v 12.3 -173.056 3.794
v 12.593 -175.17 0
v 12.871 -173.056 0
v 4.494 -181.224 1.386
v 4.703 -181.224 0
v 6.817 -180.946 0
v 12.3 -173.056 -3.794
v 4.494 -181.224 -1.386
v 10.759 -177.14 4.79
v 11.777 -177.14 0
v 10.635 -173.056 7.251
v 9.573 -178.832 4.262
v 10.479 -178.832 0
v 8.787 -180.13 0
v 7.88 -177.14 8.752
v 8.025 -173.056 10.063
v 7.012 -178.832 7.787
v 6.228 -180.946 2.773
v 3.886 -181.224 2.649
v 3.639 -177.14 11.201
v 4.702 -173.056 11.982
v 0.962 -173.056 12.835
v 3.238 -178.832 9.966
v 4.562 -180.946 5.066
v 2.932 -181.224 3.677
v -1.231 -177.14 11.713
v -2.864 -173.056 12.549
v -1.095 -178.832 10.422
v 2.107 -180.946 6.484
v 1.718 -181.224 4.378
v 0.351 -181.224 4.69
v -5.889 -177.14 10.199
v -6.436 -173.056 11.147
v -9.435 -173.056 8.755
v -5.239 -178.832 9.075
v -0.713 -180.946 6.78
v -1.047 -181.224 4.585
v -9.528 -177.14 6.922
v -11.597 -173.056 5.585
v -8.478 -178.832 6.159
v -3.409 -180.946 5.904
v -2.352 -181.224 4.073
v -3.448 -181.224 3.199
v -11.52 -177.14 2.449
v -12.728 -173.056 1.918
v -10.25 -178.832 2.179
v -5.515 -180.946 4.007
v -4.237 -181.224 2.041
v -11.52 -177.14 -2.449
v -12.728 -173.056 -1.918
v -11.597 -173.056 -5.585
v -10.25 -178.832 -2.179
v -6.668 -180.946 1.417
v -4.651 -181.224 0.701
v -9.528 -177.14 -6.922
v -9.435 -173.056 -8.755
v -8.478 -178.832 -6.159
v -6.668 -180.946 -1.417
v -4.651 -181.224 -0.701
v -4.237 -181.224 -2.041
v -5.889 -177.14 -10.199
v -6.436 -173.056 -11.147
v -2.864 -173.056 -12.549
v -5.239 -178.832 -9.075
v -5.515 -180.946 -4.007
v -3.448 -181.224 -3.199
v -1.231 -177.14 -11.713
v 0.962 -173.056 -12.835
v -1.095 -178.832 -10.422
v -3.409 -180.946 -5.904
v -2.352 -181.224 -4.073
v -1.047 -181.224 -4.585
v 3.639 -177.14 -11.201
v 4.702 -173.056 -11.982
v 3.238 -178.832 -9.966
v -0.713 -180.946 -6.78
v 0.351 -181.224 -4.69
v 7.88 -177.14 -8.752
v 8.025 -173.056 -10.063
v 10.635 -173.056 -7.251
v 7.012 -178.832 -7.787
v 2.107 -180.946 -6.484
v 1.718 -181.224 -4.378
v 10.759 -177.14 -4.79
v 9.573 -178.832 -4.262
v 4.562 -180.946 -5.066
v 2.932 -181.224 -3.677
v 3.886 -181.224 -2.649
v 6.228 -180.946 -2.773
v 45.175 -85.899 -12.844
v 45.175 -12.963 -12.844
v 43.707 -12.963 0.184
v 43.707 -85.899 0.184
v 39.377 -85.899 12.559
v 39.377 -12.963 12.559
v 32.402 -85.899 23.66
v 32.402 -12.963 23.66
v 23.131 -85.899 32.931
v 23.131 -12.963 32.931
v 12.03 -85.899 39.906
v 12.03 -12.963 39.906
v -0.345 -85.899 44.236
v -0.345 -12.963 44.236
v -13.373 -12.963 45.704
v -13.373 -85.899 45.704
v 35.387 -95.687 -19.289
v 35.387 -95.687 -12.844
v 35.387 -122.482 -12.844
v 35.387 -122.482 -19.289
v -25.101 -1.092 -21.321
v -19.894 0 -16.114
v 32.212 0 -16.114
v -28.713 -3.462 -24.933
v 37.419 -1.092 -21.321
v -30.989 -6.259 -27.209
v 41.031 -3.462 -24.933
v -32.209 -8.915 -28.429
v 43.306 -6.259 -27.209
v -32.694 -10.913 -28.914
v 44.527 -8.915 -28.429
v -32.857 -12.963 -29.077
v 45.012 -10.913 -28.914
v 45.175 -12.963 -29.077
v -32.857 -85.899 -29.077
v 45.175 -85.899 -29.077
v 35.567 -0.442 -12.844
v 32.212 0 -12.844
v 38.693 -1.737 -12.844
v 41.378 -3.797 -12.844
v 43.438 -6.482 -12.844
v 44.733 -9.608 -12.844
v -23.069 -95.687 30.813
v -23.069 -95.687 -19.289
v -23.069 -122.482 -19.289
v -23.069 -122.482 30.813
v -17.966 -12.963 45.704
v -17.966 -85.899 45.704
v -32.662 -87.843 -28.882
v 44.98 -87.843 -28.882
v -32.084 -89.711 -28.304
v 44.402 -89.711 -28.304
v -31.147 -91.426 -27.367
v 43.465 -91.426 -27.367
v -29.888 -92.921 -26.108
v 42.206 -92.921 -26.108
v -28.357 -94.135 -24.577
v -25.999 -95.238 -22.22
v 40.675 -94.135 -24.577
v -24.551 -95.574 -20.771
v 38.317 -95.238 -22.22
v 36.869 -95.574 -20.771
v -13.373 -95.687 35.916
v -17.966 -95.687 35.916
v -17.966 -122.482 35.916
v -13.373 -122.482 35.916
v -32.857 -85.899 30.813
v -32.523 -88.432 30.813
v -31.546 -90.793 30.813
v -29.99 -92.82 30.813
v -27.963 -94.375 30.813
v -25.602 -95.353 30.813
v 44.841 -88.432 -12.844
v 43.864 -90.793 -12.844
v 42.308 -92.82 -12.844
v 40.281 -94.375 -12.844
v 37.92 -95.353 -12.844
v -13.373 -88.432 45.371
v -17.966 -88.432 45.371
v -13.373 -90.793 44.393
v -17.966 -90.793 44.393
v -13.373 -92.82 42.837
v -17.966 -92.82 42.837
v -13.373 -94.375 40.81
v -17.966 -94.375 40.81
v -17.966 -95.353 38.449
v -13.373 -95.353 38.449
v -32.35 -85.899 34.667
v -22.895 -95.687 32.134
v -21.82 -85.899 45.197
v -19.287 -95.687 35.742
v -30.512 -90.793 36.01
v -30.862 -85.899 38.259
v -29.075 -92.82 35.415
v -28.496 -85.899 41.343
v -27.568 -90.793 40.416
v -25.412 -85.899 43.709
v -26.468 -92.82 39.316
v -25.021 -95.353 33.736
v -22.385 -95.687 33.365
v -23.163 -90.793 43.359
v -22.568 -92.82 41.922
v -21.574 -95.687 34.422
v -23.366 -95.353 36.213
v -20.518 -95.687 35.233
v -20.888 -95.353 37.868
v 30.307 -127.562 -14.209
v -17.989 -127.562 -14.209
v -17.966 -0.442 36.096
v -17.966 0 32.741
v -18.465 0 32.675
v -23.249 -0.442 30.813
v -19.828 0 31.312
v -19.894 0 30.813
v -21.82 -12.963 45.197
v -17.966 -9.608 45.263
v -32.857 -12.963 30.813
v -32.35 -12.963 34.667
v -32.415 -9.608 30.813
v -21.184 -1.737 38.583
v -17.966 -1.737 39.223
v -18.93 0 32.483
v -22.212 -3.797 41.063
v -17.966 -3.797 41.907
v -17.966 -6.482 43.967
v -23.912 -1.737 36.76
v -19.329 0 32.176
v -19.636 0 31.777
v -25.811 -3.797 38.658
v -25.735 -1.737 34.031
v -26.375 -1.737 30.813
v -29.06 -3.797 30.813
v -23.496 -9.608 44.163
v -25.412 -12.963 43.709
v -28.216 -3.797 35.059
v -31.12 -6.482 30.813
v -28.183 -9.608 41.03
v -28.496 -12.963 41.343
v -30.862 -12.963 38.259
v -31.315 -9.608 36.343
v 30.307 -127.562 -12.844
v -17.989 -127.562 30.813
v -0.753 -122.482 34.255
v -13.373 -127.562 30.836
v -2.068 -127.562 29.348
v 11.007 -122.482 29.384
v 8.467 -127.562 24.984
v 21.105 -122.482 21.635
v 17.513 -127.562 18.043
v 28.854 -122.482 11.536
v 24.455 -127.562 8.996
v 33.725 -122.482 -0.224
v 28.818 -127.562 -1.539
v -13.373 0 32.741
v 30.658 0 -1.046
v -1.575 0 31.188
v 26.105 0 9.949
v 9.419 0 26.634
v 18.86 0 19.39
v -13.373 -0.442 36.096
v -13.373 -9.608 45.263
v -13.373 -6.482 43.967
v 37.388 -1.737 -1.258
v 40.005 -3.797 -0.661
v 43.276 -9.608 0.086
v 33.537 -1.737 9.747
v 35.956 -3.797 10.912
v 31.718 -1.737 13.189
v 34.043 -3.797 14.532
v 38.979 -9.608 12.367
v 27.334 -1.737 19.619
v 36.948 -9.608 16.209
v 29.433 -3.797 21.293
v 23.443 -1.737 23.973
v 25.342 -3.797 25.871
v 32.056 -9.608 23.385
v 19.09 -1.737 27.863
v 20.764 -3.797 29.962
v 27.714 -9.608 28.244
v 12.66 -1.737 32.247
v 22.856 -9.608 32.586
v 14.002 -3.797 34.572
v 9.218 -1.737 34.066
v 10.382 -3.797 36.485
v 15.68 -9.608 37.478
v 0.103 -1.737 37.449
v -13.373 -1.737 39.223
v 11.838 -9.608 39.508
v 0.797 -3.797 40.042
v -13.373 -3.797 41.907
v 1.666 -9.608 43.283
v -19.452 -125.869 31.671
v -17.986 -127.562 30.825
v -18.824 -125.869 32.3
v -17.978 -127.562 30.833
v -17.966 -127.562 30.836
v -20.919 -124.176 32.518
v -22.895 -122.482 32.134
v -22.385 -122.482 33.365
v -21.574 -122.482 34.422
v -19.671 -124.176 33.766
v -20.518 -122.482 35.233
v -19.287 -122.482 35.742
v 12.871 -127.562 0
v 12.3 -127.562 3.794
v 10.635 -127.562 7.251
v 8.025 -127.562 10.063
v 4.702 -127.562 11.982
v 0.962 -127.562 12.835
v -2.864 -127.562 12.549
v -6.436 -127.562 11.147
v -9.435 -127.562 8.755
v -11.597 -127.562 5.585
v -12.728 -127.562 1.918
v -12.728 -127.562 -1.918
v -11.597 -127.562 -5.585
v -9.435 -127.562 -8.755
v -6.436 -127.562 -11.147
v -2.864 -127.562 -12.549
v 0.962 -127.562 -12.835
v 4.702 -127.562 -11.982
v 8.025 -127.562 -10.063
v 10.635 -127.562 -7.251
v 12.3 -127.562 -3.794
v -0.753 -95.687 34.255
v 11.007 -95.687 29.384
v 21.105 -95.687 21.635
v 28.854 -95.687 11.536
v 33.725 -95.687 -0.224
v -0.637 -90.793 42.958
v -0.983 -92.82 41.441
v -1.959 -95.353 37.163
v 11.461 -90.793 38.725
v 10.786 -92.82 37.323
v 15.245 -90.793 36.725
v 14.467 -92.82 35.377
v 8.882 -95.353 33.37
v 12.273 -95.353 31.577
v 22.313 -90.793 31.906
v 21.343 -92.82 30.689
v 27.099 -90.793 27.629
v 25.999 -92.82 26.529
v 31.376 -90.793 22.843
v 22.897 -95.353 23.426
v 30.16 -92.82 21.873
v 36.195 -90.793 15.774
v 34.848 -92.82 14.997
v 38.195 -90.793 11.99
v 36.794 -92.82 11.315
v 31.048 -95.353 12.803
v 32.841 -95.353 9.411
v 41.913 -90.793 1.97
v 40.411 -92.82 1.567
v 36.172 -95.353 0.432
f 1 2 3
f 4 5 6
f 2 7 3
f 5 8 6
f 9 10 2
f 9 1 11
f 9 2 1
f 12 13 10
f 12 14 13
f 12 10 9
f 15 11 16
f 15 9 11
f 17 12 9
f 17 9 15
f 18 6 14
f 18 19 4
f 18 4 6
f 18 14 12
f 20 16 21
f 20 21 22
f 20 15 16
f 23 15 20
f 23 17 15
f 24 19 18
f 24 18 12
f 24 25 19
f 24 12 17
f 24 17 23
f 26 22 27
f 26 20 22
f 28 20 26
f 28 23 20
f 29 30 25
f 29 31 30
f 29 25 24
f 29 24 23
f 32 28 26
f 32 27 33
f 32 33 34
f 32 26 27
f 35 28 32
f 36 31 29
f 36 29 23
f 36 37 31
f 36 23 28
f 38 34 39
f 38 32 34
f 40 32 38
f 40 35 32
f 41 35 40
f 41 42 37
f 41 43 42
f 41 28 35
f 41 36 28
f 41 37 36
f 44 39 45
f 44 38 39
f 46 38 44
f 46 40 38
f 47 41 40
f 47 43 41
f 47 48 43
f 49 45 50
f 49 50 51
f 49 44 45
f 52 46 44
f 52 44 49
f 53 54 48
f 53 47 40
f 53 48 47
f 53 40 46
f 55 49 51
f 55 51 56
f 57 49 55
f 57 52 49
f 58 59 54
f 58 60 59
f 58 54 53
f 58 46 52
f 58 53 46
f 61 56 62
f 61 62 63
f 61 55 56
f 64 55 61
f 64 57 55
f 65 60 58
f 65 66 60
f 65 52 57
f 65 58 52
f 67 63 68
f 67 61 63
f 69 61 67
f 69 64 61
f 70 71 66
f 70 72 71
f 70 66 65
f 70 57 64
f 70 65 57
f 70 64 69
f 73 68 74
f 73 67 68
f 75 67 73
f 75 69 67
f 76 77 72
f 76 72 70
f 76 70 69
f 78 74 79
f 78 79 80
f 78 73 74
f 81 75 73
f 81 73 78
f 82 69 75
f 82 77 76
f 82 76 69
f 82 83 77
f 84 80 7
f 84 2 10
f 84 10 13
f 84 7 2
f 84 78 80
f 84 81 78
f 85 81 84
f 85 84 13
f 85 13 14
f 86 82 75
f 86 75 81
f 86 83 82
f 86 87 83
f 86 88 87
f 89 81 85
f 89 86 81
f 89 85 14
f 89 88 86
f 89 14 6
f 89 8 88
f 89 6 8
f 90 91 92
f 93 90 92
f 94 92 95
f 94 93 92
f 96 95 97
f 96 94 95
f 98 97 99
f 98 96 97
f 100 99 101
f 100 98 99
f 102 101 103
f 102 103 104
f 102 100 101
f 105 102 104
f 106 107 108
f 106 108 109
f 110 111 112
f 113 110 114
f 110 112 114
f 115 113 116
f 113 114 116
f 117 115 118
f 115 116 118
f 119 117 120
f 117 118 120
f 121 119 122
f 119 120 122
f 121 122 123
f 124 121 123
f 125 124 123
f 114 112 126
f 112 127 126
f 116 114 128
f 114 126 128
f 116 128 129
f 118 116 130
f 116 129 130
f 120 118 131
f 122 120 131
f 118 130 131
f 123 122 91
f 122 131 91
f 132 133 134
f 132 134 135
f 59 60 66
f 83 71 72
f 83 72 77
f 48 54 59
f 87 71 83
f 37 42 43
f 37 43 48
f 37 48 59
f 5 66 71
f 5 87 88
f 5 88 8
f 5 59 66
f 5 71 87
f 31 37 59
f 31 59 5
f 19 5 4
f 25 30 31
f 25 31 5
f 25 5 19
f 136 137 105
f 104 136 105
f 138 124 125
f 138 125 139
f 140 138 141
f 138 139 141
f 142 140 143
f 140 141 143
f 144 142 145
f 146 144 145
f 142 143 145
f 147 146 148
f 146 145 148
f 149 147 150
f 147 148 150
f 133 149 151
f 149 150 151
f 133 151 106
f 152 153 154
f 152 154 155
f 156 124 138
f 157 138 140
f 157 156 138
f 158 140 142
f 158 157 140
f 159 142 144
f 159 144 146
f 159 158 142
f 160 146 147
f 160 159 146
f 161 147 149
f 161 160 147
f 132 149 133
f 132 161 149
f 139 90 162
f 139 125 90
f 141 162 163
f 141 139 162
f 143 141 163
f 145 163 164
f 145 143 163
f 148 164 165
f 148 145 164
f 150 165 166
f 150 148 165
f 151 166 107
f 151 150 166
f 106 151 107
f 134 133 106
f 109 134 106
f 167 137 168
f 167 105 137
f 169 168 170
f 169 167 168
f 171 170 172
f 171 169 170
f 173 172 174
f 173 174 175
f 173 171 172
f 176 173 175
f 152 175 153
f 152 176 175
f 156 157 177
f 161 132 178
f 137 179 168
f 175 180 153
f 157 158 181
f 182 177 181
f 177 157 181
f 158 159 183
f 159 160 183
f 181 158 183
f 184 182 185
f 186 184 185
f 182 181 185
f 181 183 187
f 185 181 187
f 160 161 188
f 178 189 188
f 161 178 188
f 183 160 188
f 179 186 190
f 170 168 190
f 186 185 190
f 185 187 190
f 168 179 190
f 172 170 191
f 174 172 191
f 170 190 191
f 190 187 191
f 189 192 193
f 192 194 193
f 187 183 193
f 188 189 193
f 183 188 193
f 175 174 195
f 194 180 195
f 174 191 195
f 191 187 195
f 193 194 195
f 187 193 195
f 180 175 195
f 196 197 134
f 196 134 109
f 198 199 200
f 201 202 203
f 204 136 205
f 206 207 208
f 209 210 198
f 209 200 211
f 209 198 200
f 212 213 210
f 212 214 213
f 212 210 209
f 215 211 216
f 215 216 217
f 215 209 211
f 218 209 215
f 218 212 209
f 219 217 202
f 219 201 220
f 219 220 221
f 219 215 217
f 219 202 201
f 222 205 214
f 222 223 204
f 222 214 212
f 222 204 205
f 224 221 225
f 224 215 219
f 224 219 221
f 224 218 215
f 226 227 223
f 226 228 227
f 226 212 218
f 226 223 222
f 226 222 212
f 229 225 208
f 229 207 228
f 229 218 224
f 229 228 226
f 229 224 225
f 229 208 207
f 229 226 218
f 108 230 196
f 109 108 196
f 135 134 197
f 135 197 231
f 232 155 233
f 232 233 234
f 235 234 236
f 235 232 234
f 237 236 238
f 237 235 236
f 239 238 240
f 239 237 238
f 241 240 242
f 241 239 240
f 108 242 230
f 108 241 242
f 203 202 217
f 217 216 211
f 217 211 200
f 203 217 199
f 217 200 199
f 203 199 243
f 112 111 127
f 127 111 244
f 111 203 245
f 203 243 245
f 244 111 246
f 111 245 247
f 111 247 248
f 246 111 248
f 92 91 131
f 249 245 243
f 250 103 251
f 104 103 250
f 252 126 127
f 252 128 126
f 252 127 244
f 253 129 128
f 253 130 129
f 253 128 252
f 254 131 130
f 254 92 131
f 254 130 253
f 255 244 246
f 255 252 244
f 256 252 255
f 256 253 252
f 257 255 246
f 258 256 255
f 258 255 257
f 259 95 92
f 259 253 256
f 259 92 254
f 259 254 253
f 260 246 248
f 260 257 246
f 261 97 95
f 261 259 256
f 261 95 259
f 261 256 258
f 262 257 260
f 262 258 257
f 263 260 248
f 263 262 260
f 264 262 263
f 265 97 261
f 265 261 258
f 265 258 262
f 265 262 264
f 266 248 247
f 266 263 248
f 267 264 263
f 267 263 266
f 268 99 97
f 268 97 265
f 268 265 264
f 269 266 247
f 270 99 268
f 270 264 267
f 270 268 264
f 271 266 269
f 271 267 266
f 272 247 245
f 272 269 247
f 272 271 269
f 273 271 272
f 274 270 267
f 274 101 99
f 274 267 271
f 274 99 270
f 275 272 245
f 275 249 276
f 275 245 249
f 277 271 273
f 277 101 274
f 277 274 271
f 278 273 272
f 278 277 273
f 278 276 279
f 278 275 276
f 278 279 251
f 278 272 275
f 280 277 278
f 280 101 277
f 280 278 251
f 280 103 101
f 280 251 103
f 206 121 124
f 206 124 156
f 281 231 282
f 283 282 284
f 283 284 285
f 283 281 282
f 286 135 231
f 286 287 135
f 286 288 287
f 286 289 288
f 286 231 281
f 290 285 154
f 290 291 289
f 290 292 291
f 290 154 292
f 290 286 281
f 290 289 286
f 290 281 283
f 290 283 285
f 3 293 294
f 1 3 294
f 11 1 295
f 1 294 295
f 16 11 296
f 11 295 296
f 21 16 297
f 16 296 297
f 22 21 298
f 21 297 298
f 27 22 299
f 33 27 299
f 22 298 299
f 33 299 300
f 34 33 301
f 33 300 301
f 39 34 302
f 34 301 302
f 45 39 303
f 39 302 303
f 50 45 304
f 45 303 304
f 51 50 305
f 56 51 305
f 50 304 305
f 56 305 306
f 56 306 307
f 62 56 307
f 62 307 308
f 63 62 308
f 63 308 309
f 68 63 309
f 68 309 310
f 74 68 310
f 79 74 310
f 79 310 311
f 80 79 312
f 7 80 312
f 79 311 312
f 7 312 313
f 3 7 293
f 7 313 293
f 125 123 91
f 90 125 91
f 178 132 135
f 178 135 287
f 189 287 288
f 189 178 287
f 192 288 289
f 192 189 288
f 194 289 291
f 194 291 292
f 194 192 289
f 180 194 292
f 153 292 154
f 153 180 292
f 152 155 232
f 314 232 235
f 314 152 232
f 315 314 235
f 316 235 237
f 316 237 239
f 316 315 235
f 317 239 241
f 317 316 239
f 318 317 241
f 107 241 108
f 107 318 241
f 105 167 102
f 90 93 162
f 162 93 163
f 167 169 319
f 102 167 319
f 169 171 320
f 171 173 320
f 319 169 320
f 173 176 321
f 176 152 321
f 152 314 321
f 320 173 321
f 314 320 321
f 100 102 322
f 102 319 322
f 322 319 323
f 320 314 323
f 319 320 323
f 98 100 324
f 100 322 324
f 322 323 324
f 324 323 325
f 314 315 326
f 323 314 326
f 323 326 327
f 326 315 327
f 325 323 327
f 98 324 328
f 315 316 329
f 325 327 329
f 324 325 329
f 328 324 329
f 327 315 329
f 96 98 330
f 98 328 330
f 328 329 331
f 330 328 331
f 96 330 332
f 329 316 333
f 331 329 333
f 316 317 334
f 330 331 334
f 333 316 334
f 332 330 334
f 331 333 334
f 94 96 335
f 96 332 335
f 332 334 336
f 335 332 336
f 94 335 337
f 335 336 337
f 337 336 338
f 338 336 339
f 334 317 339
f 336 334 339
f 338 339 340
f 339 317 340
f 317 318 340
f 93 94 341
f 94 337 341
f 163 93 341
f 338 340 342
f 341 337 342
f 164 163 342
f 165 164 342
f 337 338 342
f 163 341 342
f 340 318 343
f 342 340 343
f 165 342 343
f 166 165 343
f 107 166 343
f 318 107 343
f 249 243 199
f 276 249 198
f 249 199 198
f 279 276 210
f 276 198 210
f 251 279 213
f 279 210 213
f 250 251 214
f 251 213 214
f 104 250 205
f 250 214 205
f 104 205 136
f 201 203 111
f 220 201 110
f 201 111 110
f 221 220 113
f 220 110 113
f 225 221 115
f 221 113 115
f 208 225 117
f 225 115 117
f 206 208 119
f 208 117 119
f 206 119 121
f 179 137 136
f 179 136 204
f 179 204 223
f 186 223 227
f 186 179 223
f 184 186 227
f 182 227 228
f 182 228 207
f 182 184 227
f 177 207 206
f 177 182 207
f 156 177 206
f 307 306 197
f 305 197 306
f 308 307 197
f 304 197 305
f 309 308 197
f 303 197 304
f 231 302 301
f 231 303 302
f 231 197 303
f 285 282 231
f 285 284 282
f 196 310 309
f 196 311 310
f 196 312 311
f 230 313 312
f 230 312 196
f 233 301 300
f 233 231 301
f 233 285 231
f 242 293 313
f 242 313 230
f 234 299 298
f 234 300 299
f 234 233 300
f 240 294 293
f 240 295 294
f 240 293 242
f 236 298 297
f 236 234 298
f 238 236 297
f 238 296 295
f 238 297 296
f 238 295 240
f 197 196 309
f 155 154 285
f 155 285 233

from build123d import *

# Parameters (mm, degrees)
F0_W     = 78.0319198966
F0_H     = 74.7814178467
F1_DEPTH = 95.6868380308
F2_R     = 58.5481836396
F3_R     = 14.8908027662
F4_R     = 9.7880573939
F5_R     = 12.9631428279
F6_DEPTH = 31.8753421307
F7_SIZE  = 5.08
F8_R     = 12.871399231
F9_DEPTH = 53.6622554064
F10_R    = 8.1683236061


with BuildPart() as f1:
    # F0 (on Front) → F1 (new body)
    with BuildSketch(Plane.XZ):
        with Locations((6.1589442194, 8.3135068417)):
            Rectangle(F0_W, F0_H)
    extrude(amount=F1_DEPTH)

    # F2
    f2_edges = [f1.edges().sort_by_distance(p)[0] for p in [
        (45.174904, -47.843419, 45.704216),
    ]]
    fillet(f2_edges, radius=F2_R)

    # F3
    f3_edges = [f1.edges().sort_by_distance(p)[0] for p in [
        (-32.857016, -47.843419, 45.704216),
    ]]
    fillet(f3_edges, radius=F3_R)

    # F4
    f4_edges = [f1.edges().sort_by_distance(p)[0] for p in [
        (-15.669746, -95.686838, 45.704216),
        (-28.495601, -95.686838, 41.342801),
        (28.026538, -95.686838, 28.55585),
        (-32.857016, -95.686838, 0.868105),
        (45.174904, -95.686838, -20.960585),
        (6.158944, -95.686838, -29.077202),
    ]]
    fillet(f4_edges, radius=F4_R)

    # F5
    f5_edges = [f1.edges().sort_by_distance(p)[0] for p in [
        (28.026538, 0, 28.55585),
        (-15.669746, 0, 45.704216),
        (-28.495601, 0, 41.342801),
        (-32.857016, 0, 0.868105),
        (45.174904, 0, -20.960585),
        (6.158944, 0, -29.077202),
    ]]
    fillet(f5_edges, radius=F5_R)

    # F6 (add): a face of the model
    f6_faces = [f1.faces().sort_by_distance(p)[0] for p in [
        (2.7661274156, -95.6868380308, 5.1141155416),
    ]]
    extrude(f6_faces, amount=F6_DEPTH)

    # F7
    f7_edges = [f1.edges().sort_by_distance(p)[0] for p in [
        (35.386847, -127.56218, -16.066556),
        (6.158944, -127.56218, -19.289145),
        (21.105336, -127.56218, 21.634648),
        (-23.068958, -127.56218, 5.762134),
        (-15.669746, -127.56218, 35.916158),
        (-21.574399, -127.56218, 34.421599),
    ]]
    chamfer(f7_edges, length=F7_SIZE)

    # F8 (on face) → F9 (join)
    with BuildSketch(Plane.XZ.offset(127.5621801615)):
        Circle(F8_R)
    extrude(amount=F9_DEPTH)

    # F10
    f10_edges = [f1.edges().sort_by_distance(p)[0] for p in [
        (-12.871399, -181.224436, 0),
    ]]
    fillet(f10_edges, radius=F10_R)


solid = f1.part
